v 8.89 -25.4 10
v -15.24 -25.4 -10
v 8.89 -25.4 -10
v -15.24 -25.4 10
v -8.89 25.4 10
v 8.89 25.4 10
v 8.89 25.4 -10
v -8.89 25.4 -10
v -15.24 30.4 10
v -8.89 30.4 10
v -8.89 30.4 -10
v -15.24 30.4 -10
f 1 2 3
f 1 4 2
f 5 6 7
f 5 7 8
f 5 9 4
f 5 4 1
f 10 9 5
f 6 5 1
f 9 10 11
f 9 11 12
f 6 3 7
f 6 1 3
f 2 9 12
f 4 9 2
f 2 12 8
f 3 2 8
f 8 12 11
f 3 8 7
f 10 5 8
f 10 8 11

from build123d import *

# Parameters (mm, degrees)
BOSS_EXTRUDE1_DEPTH = 10


with BuildPart() as part:
    # Sketch1 → Boss-Extrude1 (new body, symmetric)
    with BuildSketch(Plane.XY):
        Polygon((-8.89, -25.4), (8.89, -25.4), (8.89, 25.4), (-8.89, 25.4), (-8.89, 30.4), (-15.24, 30.4), (-15.24, -25.4), align=None)
    extrude(amount=BOSS_EXTRUDE1_DEPTH, both=True)


solid = part.part
